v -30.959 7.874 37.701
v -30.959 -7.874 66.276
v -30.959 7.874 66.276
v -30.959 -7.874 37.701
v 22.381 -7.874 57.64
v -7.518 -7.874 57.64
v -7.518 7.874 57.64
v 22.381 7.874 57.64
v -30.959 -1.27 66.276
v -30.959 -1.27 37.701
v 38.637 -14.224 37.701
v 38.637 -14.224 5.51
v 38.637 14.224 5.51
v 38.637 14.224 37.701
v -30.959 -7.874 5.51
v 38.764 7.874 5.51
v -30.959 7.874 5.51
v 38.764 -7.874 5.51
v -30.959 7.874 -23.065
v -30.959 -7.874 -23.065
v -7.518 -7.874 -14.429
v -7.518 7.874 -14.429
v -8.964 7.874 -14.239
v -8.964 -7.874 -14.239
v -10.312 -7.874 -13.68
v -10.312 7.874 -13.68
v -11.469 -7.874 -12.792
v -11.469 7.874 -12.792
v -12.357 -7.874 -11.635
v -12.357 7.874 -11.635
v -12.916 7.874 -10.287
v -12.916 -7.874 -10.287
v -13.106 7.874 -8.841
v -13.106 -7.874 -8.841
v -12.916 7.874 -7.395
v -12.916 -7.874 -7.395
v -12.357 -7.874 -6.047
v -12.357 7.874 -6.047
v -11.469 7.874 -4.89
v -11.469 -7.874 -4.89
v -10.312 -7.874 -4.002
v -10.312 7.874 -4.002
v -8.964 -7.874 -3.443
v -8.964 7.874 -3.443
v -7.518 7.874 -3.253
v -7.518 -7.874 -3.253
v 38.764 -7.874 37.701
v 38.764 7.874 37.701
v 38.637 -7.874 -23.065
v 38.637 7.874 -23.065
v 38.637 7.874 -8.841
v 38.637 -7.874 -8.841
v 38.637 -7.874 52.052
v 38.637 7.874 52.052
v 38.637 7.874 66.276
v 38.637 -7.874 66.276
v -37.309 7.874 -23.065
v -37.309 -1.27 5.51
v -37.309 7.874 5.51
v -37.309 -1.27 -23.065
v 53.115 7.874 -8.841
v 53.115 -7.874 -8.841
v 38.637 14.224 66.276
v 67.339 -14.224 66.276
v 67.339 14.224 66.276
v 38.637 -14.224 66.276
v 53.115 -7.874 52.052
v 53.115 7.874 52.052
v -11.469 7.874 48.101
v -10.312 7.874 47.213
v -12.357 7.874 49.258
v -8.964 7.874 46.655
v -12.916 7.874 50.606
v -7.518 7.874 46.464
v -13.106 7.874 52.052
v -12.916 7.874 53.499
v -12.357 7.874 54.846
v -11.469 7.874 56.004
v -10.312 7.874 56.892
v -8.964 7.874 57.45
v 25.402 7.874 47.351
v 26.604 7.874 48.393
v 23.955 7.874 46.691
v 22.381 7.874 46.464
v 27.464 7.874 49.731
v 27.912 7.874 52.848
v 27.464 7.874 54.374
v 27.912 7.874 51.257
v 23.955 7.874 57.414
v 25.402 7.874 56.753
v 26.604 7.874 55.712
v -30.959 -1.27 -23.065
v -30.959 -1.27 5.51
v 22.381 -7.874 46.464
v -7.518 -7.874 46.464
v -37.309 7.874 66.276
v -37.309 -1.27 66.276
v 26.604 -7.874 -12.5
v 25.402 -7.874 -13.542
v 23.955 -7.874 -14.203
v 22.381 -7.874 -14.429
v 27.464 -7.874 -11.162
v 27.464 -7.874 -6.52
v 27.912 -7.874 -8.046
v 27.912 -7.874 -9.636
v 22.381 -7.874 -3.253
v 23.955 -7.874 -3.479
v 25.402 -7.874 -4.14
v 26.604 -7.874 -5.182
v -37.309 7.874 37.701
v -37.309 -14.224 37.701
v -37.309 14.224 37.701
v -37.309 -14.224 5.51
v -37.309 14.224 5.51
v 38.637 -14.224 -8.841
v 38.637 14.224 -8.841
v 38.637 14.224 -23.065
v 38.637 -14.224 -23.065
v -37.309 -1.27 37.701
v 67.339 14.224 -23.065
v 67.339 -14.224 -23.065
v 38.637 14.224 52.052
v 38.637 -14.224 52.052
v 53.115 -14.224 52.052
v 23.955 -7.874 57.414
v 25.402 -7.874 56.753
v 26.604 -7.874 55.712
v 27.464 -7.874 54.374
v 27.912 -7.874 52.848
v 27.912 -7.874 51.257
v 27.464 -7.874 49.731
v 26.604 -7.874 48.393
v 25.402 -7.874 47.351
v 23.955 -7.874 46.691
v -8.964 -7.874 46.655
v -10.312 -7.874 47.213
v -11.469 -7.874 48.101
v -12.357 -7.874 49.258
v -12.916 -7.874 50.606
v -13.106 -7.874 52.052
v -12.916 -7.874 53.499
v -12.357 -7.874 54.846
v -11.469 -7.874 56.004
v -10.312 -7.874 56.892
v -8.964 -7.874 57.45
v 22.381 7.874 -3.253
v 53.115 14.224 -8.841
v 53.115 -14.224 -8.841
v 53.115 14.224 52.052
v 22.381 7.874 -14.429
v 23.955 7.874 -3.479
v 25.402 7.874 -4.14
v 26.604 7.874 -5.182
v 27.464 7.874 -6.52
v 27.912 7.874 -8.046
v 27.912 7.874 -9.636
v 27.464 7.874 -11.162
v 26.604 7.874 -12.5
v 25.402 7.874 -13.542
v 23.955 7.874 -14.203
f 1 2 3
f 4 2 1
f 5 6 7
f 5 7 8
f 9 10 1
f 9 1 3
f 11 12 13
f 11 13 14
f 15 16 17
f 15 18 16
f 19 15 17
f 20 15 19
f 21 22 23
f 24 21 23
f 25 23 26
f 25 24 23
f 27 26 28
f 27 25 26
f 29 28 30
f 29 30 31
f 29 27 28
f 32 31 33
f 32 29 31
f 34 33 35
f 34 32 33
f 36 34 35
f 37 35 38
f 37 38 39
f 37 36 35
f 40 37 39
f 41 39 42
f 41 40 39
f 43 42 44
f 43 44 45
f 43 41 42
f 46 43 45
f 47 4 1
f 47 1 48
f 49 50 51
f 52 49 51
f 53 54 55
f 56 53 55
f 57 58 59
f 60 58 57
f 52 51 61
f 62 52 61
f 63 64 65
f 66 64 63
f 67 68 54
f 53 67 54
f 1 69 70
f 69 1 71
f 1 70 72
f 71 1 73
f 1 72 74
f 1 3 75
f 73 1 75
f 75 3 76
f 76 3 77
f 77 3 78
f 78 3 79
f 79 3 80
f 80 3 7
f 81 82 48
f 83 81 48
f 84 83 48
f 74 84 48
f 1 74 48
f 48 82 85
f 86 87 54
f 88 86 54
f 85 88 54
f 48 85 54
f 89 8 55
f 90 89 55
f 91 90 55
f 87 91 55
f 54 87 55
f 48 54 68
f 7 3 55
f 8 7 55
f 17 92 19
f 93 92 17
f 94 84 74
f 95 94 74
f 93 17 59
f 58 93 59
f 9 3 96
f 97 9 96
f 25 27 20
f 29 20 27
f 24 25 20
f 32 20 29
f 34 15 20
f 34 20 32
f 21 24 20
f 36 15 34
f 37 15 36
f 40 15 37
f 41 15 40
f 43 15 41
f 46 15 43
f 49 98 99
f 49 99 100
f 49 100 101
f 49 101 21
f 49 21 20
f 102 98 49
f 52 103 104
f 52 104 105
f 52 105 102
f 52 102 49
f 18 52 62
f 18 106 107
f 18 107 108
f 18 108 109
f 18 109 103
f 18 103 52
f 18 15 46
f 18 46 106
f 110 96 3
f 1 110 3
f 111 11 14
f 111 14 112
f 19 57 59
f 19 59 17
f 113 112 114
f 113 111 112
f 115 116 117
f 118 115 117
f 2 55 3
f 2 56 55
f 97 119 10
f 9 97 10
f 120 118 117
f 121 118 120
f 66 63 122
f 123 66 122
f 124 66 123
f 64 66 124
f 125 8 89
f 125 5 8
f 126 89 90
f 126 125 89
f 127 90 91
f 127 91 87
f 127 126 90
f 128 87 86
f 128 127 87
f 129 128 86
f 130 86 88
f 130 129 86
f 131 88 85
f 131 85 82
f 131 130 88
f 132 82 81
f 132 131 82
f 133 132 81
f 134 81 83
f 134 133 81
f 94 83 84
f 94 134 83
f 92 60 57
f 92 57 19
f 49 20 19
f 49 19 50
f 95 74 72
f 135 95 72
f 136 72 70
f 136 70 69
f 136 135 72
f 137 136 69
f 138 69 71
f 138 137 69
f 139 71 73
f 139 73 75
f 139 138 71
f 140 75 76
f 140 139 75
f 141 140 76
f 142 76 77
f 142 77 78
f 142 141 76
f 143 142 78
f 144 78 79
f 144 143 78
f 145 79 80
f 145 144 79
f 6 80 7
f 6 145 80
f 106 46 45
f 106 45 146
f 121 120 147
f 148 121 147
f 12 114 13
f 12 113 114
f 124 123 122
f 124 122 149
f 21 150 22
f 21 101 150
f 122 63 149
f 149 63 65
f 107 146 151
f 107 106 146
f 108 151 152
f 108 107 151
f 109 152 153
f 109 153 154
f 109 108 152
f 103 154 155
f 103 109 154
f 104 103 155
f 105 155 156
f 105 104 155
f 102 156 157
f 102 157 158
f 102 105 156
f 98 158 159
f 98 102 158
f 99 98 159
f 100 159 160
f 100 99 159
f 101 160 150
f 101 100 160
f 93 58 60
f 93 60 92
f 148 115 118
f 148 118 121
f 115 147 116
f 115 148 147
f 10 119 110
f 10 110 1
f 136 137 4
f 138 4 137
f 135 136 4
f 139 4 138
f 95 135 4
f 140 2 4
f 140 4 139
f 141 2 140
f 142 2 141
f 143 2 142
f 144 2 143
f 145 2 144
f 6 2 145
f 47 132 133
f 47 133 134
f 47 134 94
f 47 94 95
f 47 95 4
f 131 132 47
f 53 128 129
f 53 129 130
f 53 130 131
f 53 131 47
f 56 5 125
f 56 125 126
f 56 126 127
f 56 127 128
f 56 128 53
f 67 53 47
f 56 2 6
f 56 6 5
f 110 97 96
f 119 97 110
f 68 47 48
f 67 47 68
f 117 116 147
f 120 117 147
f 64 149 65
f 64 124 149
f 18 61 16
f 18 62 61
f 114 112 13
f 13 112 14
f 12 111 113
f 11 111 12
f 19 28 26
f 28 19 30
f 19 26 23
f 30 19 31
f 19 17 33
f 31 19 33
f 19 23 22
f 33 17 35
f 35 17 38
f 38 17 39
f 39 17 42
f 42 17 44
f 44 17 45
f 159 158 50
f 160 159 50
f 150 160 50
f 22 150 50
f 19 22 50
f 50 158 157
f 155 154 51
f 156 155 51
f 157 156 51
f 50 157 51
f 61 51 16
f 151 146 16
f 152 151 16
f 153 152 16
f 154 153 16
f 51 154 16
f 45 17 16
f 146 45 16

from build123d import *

# Parameters (mm, degrees)
F1_DEPTH  = 7.874
F2_DEPTH  = 14.224
F0_W      = 6.35
F0_H      = 16.0956901618
F0_W_2    = 69.596
F3_DEPTH  = 7.874
F3_FACE_W = 6.35
F3_FACE_H = 28.575
F4_DEPTH  = 6.604


with BuildPart() as f1:
    # F0 (on Front) → F1 (new body, symmetric)
    with BuildSketch(Plane.XZ):
        Polygon((38.6365454535, 5.5099498674), (-30.9594545465, 5.5099498674), (-30.9594545465, -23.0650501326), (38.6365454535, -23.0650501326), (38.6365454535, -8.8410501326), (53.1145454535, -8.8410501326), (38.7635454535, 5.5099498674), align=None)
        with BuildLine():
            ThreePointArc((-13.1061429274, -8.8410501326), (-11.4694556207, -4.8897374393), (-7.5181429274, -3.2530501326))
            Line((-7.5181429274, -3.2530501326), (22.3805454535, -3.2530501326))
            ThreePointArc((22.3805454535, -3.2530501326), (27.9685454535, -8.8410501326), (22.3805454535, -14.4290501326))
            Line((22.3805454535, -14.4290501326), (-7.5181429274, -14.4290501326))
            ThreePointArc((-7.5181429274, -14.4290501326), (-11.4694556207, -12.7923628258), (-13.1061429274, -8.8410501326))
        make_face(mode=Mode.SUBTRACT)
    extrude(amount=F1_DEPTH, both=True)


with BuildPart() as f1b:
    # F0 (on Front) → F1, piece 2 (new body, symmetric)
    with BuildSketch(Plane.XZ):
        Polygon((38.6365454535, 66.276330191), (-30.9594545465, 66.276330191), (-30.9594545465, 37.701330191), (38.6365454535, 37.701330191), (38.7635454535, 37.701330191), (53.1145454535, 52.052330191), (38.6365454535, 52.052330191), align=None)
        with BuildLine():
            Line((22.3805454535, 46.464330191), (-7.5181429274, 46.464330191))
            ThreePointArc((-7.5181429274, 46.464330191), (-11.4694556207, 48.1010174977), (-13.1061429274, 52.052330191))
            ThreePointArc((-13.1061429274, 52.052330191), (-11.4694556207, 56.0036428842), (-7.5181429274, 57.640330191))
            Line((-7.5181429274, 57.640330191), (22.3805454535, 57.640330191))
            ThreePointArc((22.3805454535, 57.640330191), (27.9685454535, 52.052330191), (22.3805454535, 46.464330191))
        make_face(mode=Mode.SUBTRACT)
    extrude(amount=F1_DEPTH, both=True)


with BuildPart() as f2:
    # F0 (on Front) → F2 (new body, symmetric)
    with BuildSketch(Plane.XZ):
        Polygon((38.6365454535, -8.8410501326), (38.6365454535, -23.0650501326), (67.3385454535, -23.0650501326), (53.1145454535, -8.8410501326), align=None)
    extrude(amount=F2_DEPTH, both=True)


with BuildPart() as f2b:
    # F0 (on Front) → F2, piece 2 (new body, symmetric)
    with BuildSketch(Plane.XZ):
        with Locations((-34.1344545465, 13.5577949483)):
            Rectangle(F0_W, F0_H)
        with Locations((3.8385454535, 13.5577949483)):
            Rectangle(F0_W_2, F0_H)
        with Locations((3.8385454535, 29.6534851101)):
            Rectangle(F0_W_2, F0_H)
        with Locations((-34.1344545465, 29.6534851101)):
            Rectangle(F0_W, F0_H)
    extrude(amount=F2_DEPTH, both=True)


with BuildPart() as f2c:
    # F0 (on Front) → F2, piece 3 (new body, symmetric)
    with BuildSketch(Plane.XZ):
        Polygon((67.3385454535, 66.276330191), (38.6365454535, 66.276330191), (38.6365454535, 52.052330191), (53.1145454535, 52.052330191), align=None)
    extrude(amount=F2_DEPTH, both=True)


with BuildPart() as f3:
    # F0 (on Front) → F3 (new body, symmetric)
    with BuildSketch(Plane.XZ):
        Polygon((-30.9594545465, 66.276330191), (-37.3094545465, 66.276330191), (-37.3094545465, 52.052330191), (-37.3094545465, 37.701330191), (-30.9594545465, 37.701330191), align=None)
    extrude(amount=F3_DEPTH, both=True)


with BuildPart() as f3b:
    # F0 (on Front) → F3, piece 2 (new body, symmetric)
    with BuildSketch(Plane.XZ):
        Polygon((-30.9594545465, -23.0650501326), (-30.9594545465, 5.5099498674), (-37.3094545465, 5.5099498674), (-37.3094545465, -8.8410501326), (-37.3094545465, -23.0650501326), align=None)
    extrude(amount=F3_DEPTH, both=True)


with BuildPart() as f4_tool:
    # F3_face (on face) → F4 (new body)
    with BuildSketch(Plane(origin=(-34.1344545465, -7.874, -8.7775501326), x_dir=(1, 0, 0), z_dir=(0, -1, 0))):
        Rectangle(F3_FACE_W, F3_FACE_H)
        with Locations((0, 60.7663803235)):
            Rectangle(F3_FACE_W, F3_FACE_H)
    extrude(amount=-F4_DEPTH)


with BuildPart() as f3_1:
    add(f3.part)

    # F4: cut by f4_tool
    add(f4_tool.part, mode=Mode.SUBTRACT)


with BuildPart() as f3b_1:
    add(f3b.part)

    # F4: cut by f4_tool
    add(f4_tool.part, mode=Mode.SUBTRACT)


solid = Compound([f1.part, f1b.part, f2.part, f2b.part, f2c.part, f3_1.part, f3b_1.part])
